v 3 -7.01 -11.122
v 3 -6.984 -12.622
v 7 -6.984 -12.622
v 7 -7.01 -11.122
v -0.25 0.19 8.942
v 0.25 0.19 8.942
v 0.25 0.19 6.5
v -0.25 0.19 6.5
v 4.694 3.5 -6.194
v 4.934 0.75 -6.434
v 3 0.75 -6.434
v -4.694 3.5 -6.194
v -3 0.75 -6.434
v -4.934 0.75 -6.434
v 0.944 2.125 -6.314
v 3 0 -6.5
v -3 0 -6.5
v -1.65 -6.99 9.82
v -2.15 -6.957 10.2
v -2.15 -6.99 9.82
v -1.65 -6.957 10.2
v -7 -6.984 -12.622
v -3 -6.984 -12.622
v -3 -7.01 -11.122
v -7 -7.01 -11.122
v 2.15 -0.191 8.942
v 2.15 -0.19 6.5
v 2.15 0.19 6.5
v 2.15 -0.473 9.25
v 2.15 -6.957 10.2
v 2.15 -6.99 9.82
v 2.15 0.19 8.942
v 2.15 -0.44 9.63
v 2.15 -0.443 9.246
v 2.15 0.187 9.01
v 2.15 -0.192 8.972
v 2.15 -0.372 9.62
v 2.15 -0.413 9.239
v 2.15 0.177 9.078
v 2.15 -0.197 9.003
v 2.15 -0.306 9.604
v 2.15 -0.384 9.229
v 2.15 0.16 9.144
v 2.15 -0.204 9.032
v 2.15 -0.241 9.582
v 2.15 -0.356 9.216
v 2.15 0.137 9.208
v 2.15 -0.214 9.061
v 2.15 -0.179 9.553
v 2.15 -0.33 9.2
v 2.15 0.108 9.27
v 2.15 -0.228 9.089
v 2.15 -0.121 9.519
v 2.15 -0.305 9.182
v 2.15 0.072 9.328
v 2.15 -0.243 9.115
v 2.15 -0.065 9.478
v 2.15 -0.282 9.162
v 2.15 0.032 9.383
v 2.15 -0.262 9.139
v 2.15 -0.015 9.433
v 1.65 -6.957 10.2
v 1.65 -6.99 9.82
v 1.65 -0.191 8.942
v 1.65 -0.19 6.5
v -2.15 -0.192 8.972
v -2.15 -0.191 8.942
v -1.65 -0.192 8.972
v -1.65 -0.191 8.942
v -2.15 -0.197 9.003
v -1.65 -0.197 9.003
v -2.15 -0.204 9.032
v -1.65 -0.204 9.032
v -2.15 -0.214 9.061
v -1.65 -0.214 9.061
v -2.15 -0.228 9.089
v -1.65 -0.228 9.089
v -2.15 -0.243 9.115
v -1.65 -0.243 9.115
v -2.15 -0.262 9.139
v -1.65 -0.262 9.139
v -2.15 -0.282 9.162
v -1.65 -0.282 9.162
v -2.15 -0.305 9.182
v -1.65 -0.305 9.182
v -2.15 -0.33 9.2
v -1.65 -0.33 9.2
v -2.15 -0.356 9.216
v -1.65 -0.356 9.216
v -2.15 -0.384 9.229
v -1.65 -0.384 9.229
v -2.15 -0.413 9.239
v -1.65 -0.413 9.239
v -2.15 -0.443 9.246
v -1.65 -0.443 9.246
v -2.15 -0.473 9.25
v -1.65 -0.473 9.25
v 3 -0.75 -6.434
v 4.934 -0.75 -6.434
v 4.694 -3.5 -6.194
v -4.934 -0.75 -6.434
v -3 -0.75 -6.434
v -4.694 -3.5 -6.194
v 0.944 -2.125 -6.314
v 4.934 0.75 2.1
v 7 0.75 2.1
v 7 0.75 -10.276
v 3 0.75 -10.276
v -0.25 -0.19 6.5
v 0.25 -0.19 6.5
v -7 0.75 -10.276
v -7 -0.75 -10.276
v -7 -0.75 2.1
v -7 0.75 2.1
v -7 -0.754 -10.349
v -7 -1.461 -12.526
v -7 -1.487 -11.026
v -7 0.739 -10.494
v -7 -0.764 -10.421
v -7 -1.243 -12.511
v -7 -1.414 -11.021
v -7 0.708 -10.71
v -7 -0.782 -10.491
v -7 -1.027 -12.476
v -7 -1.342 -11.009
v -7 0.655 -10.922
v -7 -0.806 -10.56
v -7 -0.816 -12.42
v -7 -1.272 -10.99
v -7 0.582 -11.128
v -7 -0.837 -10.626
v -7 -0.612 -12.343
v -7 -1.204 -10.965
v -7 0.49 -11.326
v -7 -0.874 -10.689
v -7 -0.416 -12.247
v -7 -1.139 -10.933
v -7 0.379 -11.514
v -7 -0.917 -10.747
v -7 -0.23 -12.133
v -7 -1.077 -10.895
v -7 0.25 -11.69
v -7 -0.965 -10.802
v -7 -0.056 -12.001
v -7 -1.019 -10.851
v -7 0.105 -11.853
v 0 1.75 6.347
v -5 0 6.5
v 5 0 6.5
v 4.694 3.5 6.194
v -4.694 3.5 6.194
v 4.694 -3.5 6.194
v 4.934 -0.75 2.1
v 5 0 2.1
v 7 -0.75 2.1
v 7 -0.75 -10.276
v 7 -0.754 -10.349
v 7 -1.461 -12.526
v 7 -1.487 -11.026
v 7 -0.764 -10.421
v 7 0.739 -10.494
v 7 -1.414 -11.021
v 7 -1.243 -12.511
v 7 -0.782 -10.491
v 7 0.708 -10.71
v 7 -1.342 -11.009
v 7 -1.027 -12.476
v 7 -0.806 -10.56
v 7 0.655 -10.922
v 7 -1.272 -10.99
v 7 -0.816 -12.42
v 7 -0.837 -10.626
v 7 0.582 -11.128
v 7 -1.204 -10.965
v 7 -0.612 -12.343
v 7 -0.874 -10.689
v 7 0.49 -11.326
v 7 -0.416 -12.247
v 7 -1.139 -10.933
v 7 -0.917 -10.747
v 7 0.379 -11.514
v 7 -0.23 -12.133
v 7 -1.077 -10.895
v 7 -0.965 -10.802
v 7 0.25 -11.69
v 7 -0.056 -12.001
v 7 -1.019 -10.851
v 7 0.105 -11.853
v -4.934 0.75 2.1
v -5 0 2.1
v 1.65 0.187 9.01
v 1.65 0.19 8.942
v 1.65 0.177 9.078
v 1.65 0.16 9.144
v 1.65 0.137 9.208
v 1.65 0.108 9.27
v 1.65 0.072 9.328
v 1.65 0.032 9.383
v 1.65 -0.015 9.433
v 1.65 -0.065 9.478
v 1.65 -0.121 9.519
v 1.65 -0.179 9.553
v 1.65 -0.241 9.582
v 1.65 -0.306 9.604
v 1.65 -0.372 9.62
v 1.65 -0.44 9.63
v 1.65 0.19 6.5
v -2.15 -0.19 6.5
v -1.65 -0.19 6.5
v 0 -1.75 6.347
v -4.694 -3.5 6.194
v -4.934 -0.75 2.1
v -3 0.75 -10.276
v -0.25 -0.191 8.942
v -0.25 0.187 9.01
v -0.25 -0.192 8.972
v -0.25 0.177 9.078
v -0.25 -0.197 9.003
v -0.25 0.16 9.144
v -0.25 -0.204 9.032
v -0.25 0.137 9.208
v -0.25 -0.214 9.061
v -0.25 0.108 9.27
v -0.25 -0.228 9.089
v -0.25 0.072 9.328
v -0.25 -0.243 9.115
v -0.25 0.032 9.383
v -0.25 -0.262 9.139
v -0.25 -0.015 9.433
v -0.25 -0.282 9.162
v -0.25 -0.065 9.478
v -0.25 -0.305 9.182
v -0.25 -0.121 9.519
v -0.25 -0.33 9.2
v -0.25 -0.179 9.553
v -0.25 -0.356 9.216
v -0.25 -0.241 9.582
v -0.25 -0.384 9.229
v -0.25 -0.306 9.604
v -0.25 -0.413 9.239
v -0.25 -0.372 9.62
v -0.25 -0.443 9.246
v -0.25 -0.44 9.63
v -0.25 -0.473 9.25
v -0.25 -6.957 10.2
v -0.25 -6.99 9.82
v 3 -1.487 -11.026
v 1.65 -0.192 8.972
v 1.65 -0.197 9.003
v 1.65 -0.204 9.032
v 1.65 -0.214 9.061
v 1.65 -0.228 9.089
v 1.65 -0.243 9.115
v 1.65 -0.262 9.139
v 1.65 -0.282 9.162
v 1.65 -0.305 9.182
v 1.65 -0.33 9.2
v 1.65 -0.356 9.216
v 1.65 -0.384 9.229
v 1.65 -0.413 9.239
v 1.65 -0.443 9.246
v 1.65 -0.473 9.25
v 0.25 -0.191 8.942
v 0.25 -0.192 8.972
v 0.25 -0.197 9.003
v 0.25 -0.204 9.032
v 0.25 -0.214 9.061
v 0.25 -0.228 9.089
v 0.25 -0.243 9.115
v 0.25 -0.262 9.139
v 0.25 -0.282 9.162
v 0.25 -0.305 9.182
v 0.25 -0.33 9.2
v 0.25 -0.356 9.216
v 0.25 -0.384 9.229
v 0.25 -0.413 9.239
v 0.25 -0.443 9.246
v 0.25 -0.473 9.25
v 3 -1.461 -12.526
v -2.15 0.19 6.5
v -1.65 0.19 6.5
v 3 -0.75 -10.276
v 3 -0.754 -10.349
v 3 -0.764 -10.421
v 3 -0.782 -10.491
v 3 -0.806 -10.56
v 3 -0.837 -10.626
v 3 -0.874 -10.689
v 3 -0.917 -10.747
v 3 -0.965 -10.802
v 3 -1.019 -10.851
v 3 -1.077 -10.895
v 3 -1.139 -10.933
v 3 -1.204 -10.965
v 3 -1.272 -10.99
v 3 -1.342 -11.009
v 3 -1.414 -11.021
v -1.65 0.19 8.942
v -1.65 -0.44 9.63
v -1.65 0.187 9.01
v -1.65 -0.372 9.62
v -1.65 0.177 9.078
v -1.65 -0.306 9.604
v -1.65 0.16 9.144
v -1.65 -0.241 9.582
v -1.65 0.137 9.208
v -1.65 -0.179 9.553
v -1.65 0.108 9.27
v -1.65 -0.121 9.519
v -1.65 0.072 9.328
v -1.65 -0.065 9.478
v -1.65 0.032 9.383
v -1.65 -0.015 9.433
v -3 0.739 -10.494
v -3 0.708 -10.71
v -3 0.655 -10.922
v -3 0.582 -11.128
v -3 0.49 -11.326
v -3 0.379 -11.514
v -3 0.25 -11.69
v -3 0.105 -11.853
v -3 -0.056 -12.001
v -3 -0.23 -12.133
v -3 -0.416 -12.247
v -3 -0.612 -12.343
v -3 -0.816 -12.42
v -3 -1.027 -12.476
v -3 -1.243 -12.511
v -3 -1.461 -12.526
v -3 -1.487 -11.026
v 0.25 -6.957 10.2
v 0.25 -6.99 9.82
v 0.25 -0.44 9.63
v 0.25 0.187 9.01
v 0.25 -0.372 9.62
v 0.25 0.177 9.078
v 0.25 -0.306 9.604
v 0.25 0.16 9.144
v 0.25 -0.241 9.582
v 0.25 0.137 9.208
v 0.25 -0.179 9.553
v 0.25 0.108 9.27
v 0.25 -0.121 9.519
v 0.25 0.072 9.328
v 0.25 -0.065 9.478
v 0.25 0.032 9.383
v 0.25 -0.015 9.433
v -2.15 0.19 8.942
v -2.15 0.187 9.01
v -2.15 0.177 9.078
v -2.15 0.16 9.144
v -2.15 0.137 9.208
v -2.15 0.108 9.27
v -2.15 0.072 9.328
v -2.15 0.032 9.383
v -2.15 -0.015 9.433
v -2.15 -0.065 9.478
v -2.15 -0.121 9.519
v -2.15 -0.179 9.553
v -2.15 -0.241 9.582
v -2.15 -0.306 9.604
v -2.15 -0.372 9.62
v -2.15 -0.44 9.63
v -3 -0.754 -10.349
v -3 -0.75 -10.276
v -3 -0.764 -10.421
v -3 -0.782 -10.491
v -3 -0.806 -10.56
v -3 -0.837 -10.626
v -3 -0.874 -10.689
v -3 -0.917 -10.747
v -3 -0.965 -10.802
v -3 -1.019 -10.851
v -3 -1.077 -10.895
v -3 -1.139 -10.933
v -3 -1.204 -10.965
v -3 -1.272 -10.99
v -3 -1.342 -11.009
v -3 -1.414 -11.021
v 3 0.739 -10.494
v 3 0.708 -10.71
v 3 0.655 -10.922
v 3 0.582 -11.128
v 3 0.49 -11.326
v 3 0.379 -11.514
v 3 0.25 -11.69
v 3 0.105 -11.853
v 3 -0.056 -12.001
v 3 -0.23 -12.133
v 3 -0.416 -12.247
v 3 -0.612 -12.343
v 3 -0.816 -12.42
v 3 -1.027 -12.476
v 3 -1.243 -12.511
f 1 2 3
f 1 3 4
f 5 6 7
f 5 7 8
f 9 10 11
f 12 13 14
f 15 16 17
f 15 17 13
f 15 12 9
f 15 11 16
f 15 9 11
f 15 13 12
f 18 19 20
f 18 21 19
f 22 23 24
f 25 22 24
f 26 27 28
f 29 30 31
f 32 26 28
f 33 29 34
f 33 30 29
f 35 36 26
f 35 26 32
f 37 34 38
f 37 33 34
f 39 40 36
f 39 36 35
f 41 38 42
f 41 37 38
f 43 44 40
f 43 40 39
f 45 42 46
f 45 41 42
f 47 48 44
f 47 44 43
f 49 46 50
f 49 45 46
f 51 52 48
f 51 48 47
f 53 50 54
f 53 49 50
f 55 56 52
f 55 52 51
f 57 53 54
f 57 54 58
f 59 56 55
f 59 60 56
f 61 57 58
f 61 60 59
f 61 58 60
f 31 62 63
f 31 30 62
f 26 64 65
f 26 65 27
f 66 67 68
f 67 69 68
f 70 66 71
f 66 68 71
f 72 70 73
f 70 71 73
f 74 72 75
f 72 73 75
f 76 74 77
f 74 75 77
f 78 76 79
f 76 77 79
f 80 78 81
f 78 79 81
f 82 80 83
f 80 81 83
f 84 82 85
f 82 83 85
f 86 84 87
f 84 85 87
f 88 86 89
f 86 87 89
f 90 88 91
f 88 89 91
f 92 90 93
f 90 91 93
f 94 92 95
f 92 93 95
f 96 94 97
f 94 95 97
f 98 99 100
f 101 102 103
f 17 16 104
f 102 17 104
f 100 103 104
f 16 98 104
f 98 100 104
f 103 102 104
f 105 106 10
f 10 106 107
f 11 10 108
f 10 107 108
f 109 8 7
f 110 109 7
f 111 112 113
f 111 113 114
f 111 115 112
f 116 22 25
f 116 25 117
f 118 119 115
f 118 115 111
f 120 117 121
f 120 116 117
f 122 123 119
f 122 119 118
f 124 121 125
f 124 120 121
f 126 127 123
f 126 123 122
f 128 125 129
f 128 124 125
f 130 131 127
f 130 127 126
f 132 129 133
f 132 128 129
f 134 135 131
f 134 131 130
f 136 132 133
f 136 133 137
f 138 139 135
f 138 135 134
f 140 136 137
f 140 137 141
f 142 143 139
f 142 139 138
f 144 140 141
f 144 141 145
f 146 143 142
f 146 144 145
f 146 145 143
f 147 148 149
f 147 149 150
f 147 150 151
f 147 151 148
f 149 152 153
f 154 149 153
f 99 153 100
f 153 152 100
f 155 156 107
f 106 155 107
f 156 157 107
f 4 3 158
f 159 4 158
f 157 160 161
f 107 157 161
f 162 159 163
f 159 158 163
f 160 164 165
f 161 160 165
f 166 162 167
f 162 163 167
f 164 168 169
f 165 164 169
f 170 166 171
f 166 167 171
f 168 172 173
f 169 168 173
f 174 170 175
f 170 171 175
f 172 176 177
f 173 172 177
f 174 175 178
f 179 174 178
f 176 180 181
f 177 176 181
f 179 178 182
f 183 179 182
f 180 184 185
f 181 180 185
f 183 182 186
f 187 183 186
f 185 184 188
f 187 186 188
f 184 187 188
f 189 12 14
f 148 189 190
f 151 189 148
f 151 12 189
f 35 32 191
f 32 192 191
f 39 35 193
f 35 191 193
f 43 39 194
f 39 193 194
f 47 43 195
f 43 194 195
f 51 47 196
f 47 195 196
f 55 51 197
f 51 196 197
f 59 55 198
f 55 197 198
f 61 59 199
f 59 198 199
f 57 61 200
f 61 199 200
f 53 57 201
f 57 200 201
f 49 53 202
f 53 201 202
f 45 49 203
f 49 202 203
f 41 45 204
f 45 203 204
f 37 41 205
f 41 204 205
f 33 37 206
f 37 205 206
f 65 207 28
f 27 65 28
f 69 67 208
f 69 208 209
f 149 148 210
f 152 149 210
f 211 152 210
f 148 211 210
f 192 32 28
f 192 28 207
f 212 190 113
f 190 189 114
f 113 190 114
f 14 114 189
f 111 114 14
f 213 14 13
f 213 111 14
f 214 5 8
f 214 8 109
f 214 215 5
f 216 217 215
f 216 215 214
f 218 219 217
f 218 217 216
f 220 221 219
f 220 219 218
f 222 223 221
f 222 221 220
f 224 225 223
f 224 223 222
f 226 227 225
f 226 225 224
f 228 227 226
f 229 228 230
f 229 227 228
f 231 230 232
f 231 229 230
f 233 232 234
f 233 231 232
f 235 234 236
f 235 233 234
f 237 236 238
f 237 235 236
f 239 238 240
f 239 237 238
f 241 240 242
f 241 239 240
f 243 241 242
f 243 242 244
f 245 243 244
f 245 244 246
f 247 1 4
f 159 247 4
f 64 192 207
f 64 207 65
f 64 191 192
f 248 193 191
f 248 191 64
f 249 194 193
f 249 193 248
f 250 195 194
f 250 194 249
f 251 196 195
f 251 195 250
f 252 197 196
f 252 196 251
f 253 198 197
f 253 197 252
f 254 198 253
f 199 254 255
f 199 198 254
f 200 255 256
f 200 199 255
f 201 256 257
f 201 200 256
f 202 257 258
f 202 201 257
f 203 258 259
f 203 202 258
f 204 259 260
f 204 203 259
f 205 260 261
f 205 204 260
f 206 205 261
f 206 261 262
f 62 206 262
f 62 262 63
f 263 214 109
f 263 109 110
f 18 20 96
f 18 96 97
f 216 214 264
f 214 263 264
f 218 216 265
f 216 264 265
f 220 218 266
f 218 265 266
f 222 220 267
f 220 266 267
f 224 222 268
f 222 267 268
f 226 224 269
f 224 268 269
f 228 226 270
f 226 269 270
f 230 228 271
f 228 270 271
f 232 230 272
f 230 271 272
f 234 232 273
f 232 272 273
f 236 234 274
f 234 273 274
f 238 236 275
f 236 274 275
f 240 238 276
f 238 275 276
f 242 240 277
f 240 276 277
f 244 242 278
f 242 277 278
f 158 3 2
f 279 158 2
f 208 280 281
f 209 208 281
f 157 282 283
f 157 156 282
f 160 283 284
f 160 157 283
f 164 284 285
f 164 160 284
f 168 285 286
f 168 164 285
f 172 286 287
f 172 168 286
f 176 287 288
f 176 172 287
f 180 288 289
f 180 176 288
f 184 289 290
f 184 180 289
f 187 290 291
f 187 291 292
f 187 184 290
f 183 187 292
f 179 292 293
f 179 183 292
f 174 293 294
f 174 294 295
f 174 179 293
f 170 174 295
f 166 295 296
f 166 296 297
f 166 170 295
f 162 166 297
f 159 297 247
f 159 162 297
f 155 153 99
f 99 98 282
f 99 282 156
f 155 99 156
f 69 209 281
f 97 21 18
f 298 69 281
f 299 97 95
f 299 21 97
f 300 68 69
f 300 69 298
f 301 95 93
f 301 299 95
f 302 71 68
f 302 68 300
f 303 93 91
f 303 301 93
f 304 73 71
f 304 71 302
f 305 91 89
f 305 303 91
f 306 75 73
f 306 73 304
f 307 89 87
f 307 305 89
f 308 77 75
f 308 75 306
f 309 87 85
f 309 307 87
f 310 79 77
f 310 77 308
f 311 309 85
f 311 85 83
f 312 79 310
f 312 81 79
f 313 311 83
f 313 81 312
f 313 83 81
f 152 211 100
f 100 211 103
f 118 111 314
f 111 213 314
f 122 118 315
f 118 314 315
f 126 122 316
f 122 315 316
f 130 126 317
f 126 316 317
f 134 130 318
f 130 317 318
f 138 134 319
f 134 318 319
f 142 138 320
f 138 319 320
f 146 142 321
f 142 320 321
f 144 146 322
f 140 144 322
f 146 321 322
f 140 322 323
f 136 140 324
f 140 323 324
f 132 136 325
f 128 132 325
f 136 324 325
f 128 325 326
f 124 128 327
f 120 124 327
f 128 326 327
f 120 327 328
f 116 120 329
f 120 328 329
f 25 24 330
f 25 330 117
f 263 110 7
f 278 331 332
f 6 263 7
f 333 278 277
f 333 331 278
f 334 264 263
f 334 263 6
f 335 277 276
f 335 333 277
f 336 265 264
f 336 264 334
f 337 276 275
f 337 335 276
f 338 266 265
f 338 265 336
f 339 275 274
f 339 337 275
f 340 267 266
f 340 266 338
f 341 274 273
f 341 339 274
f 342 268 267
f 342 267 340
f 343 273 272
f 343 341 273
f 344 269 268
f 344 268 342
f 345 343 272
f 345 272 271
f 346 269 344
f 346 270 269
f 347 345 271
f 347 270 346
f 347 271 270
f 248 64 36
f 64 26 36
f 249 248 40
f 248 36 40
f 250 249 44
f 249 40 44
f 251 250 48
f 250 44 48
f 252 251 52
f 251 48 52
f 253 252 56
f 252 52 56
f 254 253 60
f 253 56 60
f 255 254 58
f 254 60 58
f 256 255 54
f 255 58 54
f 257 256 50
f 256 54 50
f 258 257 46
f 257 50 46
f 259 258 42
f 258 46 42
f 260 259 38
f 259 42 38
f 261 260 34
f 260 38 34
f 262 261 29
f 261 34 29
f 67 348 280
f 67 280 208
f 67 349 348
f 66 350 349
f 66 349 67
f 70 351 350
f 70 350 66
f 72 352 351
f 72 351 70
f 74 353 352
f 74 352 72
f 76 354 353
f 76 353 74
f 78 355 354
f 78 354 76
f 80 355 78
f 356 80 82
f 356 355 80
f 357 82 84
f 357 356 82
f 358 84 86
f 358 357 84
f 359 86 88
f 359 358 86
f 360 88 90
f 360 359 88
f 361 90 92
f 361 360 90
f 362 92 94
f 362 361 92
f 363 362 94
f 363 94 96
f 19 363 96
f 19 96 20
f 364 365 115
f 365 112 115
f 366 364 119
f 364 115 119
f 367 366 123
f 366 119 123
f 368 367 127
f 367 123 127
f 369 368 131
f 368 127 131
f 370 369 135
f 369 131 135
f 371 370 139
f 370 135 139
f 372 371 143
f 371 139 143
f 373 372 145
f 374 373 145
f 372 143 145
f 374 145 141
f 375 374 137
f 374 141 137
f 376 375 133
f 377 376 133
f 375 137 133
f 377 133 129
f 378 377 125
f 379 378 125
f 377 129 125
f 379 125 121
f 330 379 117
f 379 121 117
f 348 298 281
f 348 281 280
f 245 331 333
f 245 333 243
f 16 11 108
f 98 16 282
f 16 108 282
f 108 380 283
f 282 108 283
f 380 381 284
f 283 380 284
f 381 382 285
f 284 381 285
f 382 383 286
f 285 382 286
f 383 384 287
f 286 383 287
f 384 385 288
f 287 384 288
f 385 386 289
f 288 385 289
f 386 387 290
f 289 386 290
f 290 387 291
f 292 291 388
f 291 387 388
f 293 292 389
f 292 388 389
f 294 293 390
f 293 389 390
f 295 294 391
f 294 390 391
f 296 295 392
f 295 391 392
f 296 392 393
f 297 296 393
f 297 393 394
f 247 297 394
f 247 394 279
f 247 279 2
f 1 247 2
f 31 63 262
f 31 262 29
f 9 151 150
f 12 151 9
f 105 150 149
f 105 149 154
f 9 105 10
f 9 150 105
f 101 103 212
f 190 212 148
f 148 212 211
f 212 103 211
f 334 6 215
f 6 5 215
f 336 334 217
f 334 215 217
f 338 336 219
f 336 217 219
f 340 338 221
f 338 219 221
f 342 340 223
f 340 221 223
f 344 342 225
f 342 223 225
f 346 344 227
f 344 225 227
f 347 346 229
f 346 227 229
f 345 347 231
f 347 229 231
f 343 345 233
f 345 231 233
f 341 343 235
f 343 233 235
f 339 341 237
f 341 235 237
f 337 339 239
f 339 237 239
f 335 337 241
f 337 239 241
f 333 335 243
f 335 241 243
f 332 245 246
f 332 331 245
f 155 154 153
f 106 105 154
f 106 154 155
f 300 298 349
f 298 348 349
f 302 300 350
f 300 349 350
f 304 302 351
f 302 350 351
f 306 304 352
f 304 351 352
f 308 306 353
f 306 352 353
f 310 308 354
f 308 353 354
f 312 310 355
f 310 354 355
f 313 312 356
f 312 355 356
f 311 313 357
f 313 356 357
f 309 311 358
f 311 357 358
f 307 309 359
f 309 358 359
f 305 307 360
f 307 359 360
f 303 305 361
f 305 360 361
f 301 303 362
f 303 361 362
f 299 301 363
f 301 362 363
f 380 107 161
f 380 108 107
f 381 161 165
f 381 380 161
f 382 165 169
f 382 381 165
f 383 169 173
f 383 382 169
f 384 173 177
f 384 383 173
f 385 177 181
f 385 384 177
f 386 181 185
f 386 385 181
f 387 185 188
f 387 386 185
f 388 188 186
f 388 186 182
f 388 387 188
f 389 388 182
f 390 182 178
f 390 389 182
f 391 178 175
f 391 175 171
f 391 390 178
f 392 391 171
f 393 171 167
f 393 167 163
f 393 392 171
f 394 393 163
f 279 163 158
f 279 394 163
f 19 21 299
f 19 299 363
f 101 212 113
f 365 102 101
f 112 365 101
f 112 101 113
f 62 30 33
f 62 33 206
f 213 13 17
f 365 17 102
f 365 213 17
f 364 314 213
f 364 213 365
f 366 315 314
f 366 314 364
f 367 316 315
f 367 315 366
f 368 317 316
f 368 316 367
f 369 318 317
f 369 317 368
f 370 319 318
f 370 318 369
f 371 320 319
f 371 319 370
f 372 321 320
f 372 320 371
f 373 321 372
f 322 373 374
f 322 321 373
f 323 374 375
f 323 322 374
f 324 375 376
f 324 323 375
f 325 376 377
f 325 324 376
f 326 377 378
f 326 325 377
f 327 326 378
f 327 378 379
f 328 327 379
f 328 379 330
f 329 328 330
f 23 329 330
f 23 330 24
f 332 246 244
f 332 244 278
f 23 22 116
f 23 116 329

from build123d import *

# Parameters (mm, degrees)
SKETCH1_W                = 10
SKETCH1_H                = 13
EXTRUDE1_DEPTH           = 3.5
EXTRUDE1_TAPER           = 5
EXTRUDE1_OTHER_WAY_DEPTH = 3.5
EXTRUDE1_OTHER_WAY_TAPER = 5
SKETCH3_W                = 0.5
SKETCH3_H                = 0.381
SKETCH5_W                = 4
SKETCH5_H                = 1.5


with BuildPart() as part:
    # Sketch1 → Extrude1 (new body)
    with BuildSketch(Plane(origin=(0, 0, 0), x_dir=(1, 0, 0), z_dir=(0, 1, 0))):
        Rectangle(SKETCH1_W, SKETCH1_H)
    extrude(amount=EXTRUDE1_DEPTH, taper=EXTRUDE1_TAPER)

    # Sketch1 → Extrude1 other way (add)
    with BuildSketch(Plane(origin=(0, 0, 0), x_dir=(1, 0, 0), z_dir=(0, 1, 0))):
        Rectangle(SKETCH1_W, SKETCH1_H)
    extrude(amount=-EXTRUDE1_OTHER_WAY_DEPTH, taper=EXTRUDE1_OTHER_WAY_TAPER)

    # Sweep2: sweep along a path in Sketch4
    with BuildLine(Plane(origin=(5, 0, 0), x_dir=(0, 0, -1), z_dir=(1, 0, 0))) as sweep2_path:
        Line((-2.1, 0), (10.275954105, 0))
        ThreePointArc((10.275954105, 0), (11.327318002, -0.430124326), (11.775725648, -1.47382139))
        Line((11.775725648, -1.47382139), (11.87212638, -6.996615616))
    # Sketch5 → Sweep2 (sweep)
    with BuildSketch(Plane.XY.offset(2.1)):
        with Locations((5, 0)):
            Rectangle(SKETCH5_W, SKETCH5_H)
    sweep2 = sweep(path=sweep2_path.line)

    # Mirror1: Sweep2 across plane
    add(sweep2.mirror(Plane(origin=(0, 0, 0), x_dir=(0, 0, 1), z_dir=(1, 0, 0))))


with BuildPart() as body_2:
    # Sweep1: sweep along a path in Sketch2
    with BuildLine(Plane(origin=(0, 0, 0), x_dir=(0, 0, -1), z_dir=(1, 0, 0))) as sweep1_path:
        Line((-6.5, 0), (-8.941834413, 0))
        ThreePointArc((-8.941834413, 0), (-9.279629517, -0.131361332), (-9.439931762, -0.456422129))
        Line((-9.439931762, -0.456422129), (-10.010090199, -6.973362887))
    # Sketch3 → Sweep1 (sweep)
    with BuildSketch(Plane.XY.offset(6.5)):
        with Locations((1.9, 0)):
            Rectangle(SKETCH3_W, SKETCH3_H)
        Rectangle(SKETCH3_W, SKETCH3_H)
        with Locations((-1.9, 0)):
            Rectangle(SKETCH3_W, SKETCH3_H)
    sweep(path=sweep1_path.line)


solid = Compound([part.part, body_2.part])
